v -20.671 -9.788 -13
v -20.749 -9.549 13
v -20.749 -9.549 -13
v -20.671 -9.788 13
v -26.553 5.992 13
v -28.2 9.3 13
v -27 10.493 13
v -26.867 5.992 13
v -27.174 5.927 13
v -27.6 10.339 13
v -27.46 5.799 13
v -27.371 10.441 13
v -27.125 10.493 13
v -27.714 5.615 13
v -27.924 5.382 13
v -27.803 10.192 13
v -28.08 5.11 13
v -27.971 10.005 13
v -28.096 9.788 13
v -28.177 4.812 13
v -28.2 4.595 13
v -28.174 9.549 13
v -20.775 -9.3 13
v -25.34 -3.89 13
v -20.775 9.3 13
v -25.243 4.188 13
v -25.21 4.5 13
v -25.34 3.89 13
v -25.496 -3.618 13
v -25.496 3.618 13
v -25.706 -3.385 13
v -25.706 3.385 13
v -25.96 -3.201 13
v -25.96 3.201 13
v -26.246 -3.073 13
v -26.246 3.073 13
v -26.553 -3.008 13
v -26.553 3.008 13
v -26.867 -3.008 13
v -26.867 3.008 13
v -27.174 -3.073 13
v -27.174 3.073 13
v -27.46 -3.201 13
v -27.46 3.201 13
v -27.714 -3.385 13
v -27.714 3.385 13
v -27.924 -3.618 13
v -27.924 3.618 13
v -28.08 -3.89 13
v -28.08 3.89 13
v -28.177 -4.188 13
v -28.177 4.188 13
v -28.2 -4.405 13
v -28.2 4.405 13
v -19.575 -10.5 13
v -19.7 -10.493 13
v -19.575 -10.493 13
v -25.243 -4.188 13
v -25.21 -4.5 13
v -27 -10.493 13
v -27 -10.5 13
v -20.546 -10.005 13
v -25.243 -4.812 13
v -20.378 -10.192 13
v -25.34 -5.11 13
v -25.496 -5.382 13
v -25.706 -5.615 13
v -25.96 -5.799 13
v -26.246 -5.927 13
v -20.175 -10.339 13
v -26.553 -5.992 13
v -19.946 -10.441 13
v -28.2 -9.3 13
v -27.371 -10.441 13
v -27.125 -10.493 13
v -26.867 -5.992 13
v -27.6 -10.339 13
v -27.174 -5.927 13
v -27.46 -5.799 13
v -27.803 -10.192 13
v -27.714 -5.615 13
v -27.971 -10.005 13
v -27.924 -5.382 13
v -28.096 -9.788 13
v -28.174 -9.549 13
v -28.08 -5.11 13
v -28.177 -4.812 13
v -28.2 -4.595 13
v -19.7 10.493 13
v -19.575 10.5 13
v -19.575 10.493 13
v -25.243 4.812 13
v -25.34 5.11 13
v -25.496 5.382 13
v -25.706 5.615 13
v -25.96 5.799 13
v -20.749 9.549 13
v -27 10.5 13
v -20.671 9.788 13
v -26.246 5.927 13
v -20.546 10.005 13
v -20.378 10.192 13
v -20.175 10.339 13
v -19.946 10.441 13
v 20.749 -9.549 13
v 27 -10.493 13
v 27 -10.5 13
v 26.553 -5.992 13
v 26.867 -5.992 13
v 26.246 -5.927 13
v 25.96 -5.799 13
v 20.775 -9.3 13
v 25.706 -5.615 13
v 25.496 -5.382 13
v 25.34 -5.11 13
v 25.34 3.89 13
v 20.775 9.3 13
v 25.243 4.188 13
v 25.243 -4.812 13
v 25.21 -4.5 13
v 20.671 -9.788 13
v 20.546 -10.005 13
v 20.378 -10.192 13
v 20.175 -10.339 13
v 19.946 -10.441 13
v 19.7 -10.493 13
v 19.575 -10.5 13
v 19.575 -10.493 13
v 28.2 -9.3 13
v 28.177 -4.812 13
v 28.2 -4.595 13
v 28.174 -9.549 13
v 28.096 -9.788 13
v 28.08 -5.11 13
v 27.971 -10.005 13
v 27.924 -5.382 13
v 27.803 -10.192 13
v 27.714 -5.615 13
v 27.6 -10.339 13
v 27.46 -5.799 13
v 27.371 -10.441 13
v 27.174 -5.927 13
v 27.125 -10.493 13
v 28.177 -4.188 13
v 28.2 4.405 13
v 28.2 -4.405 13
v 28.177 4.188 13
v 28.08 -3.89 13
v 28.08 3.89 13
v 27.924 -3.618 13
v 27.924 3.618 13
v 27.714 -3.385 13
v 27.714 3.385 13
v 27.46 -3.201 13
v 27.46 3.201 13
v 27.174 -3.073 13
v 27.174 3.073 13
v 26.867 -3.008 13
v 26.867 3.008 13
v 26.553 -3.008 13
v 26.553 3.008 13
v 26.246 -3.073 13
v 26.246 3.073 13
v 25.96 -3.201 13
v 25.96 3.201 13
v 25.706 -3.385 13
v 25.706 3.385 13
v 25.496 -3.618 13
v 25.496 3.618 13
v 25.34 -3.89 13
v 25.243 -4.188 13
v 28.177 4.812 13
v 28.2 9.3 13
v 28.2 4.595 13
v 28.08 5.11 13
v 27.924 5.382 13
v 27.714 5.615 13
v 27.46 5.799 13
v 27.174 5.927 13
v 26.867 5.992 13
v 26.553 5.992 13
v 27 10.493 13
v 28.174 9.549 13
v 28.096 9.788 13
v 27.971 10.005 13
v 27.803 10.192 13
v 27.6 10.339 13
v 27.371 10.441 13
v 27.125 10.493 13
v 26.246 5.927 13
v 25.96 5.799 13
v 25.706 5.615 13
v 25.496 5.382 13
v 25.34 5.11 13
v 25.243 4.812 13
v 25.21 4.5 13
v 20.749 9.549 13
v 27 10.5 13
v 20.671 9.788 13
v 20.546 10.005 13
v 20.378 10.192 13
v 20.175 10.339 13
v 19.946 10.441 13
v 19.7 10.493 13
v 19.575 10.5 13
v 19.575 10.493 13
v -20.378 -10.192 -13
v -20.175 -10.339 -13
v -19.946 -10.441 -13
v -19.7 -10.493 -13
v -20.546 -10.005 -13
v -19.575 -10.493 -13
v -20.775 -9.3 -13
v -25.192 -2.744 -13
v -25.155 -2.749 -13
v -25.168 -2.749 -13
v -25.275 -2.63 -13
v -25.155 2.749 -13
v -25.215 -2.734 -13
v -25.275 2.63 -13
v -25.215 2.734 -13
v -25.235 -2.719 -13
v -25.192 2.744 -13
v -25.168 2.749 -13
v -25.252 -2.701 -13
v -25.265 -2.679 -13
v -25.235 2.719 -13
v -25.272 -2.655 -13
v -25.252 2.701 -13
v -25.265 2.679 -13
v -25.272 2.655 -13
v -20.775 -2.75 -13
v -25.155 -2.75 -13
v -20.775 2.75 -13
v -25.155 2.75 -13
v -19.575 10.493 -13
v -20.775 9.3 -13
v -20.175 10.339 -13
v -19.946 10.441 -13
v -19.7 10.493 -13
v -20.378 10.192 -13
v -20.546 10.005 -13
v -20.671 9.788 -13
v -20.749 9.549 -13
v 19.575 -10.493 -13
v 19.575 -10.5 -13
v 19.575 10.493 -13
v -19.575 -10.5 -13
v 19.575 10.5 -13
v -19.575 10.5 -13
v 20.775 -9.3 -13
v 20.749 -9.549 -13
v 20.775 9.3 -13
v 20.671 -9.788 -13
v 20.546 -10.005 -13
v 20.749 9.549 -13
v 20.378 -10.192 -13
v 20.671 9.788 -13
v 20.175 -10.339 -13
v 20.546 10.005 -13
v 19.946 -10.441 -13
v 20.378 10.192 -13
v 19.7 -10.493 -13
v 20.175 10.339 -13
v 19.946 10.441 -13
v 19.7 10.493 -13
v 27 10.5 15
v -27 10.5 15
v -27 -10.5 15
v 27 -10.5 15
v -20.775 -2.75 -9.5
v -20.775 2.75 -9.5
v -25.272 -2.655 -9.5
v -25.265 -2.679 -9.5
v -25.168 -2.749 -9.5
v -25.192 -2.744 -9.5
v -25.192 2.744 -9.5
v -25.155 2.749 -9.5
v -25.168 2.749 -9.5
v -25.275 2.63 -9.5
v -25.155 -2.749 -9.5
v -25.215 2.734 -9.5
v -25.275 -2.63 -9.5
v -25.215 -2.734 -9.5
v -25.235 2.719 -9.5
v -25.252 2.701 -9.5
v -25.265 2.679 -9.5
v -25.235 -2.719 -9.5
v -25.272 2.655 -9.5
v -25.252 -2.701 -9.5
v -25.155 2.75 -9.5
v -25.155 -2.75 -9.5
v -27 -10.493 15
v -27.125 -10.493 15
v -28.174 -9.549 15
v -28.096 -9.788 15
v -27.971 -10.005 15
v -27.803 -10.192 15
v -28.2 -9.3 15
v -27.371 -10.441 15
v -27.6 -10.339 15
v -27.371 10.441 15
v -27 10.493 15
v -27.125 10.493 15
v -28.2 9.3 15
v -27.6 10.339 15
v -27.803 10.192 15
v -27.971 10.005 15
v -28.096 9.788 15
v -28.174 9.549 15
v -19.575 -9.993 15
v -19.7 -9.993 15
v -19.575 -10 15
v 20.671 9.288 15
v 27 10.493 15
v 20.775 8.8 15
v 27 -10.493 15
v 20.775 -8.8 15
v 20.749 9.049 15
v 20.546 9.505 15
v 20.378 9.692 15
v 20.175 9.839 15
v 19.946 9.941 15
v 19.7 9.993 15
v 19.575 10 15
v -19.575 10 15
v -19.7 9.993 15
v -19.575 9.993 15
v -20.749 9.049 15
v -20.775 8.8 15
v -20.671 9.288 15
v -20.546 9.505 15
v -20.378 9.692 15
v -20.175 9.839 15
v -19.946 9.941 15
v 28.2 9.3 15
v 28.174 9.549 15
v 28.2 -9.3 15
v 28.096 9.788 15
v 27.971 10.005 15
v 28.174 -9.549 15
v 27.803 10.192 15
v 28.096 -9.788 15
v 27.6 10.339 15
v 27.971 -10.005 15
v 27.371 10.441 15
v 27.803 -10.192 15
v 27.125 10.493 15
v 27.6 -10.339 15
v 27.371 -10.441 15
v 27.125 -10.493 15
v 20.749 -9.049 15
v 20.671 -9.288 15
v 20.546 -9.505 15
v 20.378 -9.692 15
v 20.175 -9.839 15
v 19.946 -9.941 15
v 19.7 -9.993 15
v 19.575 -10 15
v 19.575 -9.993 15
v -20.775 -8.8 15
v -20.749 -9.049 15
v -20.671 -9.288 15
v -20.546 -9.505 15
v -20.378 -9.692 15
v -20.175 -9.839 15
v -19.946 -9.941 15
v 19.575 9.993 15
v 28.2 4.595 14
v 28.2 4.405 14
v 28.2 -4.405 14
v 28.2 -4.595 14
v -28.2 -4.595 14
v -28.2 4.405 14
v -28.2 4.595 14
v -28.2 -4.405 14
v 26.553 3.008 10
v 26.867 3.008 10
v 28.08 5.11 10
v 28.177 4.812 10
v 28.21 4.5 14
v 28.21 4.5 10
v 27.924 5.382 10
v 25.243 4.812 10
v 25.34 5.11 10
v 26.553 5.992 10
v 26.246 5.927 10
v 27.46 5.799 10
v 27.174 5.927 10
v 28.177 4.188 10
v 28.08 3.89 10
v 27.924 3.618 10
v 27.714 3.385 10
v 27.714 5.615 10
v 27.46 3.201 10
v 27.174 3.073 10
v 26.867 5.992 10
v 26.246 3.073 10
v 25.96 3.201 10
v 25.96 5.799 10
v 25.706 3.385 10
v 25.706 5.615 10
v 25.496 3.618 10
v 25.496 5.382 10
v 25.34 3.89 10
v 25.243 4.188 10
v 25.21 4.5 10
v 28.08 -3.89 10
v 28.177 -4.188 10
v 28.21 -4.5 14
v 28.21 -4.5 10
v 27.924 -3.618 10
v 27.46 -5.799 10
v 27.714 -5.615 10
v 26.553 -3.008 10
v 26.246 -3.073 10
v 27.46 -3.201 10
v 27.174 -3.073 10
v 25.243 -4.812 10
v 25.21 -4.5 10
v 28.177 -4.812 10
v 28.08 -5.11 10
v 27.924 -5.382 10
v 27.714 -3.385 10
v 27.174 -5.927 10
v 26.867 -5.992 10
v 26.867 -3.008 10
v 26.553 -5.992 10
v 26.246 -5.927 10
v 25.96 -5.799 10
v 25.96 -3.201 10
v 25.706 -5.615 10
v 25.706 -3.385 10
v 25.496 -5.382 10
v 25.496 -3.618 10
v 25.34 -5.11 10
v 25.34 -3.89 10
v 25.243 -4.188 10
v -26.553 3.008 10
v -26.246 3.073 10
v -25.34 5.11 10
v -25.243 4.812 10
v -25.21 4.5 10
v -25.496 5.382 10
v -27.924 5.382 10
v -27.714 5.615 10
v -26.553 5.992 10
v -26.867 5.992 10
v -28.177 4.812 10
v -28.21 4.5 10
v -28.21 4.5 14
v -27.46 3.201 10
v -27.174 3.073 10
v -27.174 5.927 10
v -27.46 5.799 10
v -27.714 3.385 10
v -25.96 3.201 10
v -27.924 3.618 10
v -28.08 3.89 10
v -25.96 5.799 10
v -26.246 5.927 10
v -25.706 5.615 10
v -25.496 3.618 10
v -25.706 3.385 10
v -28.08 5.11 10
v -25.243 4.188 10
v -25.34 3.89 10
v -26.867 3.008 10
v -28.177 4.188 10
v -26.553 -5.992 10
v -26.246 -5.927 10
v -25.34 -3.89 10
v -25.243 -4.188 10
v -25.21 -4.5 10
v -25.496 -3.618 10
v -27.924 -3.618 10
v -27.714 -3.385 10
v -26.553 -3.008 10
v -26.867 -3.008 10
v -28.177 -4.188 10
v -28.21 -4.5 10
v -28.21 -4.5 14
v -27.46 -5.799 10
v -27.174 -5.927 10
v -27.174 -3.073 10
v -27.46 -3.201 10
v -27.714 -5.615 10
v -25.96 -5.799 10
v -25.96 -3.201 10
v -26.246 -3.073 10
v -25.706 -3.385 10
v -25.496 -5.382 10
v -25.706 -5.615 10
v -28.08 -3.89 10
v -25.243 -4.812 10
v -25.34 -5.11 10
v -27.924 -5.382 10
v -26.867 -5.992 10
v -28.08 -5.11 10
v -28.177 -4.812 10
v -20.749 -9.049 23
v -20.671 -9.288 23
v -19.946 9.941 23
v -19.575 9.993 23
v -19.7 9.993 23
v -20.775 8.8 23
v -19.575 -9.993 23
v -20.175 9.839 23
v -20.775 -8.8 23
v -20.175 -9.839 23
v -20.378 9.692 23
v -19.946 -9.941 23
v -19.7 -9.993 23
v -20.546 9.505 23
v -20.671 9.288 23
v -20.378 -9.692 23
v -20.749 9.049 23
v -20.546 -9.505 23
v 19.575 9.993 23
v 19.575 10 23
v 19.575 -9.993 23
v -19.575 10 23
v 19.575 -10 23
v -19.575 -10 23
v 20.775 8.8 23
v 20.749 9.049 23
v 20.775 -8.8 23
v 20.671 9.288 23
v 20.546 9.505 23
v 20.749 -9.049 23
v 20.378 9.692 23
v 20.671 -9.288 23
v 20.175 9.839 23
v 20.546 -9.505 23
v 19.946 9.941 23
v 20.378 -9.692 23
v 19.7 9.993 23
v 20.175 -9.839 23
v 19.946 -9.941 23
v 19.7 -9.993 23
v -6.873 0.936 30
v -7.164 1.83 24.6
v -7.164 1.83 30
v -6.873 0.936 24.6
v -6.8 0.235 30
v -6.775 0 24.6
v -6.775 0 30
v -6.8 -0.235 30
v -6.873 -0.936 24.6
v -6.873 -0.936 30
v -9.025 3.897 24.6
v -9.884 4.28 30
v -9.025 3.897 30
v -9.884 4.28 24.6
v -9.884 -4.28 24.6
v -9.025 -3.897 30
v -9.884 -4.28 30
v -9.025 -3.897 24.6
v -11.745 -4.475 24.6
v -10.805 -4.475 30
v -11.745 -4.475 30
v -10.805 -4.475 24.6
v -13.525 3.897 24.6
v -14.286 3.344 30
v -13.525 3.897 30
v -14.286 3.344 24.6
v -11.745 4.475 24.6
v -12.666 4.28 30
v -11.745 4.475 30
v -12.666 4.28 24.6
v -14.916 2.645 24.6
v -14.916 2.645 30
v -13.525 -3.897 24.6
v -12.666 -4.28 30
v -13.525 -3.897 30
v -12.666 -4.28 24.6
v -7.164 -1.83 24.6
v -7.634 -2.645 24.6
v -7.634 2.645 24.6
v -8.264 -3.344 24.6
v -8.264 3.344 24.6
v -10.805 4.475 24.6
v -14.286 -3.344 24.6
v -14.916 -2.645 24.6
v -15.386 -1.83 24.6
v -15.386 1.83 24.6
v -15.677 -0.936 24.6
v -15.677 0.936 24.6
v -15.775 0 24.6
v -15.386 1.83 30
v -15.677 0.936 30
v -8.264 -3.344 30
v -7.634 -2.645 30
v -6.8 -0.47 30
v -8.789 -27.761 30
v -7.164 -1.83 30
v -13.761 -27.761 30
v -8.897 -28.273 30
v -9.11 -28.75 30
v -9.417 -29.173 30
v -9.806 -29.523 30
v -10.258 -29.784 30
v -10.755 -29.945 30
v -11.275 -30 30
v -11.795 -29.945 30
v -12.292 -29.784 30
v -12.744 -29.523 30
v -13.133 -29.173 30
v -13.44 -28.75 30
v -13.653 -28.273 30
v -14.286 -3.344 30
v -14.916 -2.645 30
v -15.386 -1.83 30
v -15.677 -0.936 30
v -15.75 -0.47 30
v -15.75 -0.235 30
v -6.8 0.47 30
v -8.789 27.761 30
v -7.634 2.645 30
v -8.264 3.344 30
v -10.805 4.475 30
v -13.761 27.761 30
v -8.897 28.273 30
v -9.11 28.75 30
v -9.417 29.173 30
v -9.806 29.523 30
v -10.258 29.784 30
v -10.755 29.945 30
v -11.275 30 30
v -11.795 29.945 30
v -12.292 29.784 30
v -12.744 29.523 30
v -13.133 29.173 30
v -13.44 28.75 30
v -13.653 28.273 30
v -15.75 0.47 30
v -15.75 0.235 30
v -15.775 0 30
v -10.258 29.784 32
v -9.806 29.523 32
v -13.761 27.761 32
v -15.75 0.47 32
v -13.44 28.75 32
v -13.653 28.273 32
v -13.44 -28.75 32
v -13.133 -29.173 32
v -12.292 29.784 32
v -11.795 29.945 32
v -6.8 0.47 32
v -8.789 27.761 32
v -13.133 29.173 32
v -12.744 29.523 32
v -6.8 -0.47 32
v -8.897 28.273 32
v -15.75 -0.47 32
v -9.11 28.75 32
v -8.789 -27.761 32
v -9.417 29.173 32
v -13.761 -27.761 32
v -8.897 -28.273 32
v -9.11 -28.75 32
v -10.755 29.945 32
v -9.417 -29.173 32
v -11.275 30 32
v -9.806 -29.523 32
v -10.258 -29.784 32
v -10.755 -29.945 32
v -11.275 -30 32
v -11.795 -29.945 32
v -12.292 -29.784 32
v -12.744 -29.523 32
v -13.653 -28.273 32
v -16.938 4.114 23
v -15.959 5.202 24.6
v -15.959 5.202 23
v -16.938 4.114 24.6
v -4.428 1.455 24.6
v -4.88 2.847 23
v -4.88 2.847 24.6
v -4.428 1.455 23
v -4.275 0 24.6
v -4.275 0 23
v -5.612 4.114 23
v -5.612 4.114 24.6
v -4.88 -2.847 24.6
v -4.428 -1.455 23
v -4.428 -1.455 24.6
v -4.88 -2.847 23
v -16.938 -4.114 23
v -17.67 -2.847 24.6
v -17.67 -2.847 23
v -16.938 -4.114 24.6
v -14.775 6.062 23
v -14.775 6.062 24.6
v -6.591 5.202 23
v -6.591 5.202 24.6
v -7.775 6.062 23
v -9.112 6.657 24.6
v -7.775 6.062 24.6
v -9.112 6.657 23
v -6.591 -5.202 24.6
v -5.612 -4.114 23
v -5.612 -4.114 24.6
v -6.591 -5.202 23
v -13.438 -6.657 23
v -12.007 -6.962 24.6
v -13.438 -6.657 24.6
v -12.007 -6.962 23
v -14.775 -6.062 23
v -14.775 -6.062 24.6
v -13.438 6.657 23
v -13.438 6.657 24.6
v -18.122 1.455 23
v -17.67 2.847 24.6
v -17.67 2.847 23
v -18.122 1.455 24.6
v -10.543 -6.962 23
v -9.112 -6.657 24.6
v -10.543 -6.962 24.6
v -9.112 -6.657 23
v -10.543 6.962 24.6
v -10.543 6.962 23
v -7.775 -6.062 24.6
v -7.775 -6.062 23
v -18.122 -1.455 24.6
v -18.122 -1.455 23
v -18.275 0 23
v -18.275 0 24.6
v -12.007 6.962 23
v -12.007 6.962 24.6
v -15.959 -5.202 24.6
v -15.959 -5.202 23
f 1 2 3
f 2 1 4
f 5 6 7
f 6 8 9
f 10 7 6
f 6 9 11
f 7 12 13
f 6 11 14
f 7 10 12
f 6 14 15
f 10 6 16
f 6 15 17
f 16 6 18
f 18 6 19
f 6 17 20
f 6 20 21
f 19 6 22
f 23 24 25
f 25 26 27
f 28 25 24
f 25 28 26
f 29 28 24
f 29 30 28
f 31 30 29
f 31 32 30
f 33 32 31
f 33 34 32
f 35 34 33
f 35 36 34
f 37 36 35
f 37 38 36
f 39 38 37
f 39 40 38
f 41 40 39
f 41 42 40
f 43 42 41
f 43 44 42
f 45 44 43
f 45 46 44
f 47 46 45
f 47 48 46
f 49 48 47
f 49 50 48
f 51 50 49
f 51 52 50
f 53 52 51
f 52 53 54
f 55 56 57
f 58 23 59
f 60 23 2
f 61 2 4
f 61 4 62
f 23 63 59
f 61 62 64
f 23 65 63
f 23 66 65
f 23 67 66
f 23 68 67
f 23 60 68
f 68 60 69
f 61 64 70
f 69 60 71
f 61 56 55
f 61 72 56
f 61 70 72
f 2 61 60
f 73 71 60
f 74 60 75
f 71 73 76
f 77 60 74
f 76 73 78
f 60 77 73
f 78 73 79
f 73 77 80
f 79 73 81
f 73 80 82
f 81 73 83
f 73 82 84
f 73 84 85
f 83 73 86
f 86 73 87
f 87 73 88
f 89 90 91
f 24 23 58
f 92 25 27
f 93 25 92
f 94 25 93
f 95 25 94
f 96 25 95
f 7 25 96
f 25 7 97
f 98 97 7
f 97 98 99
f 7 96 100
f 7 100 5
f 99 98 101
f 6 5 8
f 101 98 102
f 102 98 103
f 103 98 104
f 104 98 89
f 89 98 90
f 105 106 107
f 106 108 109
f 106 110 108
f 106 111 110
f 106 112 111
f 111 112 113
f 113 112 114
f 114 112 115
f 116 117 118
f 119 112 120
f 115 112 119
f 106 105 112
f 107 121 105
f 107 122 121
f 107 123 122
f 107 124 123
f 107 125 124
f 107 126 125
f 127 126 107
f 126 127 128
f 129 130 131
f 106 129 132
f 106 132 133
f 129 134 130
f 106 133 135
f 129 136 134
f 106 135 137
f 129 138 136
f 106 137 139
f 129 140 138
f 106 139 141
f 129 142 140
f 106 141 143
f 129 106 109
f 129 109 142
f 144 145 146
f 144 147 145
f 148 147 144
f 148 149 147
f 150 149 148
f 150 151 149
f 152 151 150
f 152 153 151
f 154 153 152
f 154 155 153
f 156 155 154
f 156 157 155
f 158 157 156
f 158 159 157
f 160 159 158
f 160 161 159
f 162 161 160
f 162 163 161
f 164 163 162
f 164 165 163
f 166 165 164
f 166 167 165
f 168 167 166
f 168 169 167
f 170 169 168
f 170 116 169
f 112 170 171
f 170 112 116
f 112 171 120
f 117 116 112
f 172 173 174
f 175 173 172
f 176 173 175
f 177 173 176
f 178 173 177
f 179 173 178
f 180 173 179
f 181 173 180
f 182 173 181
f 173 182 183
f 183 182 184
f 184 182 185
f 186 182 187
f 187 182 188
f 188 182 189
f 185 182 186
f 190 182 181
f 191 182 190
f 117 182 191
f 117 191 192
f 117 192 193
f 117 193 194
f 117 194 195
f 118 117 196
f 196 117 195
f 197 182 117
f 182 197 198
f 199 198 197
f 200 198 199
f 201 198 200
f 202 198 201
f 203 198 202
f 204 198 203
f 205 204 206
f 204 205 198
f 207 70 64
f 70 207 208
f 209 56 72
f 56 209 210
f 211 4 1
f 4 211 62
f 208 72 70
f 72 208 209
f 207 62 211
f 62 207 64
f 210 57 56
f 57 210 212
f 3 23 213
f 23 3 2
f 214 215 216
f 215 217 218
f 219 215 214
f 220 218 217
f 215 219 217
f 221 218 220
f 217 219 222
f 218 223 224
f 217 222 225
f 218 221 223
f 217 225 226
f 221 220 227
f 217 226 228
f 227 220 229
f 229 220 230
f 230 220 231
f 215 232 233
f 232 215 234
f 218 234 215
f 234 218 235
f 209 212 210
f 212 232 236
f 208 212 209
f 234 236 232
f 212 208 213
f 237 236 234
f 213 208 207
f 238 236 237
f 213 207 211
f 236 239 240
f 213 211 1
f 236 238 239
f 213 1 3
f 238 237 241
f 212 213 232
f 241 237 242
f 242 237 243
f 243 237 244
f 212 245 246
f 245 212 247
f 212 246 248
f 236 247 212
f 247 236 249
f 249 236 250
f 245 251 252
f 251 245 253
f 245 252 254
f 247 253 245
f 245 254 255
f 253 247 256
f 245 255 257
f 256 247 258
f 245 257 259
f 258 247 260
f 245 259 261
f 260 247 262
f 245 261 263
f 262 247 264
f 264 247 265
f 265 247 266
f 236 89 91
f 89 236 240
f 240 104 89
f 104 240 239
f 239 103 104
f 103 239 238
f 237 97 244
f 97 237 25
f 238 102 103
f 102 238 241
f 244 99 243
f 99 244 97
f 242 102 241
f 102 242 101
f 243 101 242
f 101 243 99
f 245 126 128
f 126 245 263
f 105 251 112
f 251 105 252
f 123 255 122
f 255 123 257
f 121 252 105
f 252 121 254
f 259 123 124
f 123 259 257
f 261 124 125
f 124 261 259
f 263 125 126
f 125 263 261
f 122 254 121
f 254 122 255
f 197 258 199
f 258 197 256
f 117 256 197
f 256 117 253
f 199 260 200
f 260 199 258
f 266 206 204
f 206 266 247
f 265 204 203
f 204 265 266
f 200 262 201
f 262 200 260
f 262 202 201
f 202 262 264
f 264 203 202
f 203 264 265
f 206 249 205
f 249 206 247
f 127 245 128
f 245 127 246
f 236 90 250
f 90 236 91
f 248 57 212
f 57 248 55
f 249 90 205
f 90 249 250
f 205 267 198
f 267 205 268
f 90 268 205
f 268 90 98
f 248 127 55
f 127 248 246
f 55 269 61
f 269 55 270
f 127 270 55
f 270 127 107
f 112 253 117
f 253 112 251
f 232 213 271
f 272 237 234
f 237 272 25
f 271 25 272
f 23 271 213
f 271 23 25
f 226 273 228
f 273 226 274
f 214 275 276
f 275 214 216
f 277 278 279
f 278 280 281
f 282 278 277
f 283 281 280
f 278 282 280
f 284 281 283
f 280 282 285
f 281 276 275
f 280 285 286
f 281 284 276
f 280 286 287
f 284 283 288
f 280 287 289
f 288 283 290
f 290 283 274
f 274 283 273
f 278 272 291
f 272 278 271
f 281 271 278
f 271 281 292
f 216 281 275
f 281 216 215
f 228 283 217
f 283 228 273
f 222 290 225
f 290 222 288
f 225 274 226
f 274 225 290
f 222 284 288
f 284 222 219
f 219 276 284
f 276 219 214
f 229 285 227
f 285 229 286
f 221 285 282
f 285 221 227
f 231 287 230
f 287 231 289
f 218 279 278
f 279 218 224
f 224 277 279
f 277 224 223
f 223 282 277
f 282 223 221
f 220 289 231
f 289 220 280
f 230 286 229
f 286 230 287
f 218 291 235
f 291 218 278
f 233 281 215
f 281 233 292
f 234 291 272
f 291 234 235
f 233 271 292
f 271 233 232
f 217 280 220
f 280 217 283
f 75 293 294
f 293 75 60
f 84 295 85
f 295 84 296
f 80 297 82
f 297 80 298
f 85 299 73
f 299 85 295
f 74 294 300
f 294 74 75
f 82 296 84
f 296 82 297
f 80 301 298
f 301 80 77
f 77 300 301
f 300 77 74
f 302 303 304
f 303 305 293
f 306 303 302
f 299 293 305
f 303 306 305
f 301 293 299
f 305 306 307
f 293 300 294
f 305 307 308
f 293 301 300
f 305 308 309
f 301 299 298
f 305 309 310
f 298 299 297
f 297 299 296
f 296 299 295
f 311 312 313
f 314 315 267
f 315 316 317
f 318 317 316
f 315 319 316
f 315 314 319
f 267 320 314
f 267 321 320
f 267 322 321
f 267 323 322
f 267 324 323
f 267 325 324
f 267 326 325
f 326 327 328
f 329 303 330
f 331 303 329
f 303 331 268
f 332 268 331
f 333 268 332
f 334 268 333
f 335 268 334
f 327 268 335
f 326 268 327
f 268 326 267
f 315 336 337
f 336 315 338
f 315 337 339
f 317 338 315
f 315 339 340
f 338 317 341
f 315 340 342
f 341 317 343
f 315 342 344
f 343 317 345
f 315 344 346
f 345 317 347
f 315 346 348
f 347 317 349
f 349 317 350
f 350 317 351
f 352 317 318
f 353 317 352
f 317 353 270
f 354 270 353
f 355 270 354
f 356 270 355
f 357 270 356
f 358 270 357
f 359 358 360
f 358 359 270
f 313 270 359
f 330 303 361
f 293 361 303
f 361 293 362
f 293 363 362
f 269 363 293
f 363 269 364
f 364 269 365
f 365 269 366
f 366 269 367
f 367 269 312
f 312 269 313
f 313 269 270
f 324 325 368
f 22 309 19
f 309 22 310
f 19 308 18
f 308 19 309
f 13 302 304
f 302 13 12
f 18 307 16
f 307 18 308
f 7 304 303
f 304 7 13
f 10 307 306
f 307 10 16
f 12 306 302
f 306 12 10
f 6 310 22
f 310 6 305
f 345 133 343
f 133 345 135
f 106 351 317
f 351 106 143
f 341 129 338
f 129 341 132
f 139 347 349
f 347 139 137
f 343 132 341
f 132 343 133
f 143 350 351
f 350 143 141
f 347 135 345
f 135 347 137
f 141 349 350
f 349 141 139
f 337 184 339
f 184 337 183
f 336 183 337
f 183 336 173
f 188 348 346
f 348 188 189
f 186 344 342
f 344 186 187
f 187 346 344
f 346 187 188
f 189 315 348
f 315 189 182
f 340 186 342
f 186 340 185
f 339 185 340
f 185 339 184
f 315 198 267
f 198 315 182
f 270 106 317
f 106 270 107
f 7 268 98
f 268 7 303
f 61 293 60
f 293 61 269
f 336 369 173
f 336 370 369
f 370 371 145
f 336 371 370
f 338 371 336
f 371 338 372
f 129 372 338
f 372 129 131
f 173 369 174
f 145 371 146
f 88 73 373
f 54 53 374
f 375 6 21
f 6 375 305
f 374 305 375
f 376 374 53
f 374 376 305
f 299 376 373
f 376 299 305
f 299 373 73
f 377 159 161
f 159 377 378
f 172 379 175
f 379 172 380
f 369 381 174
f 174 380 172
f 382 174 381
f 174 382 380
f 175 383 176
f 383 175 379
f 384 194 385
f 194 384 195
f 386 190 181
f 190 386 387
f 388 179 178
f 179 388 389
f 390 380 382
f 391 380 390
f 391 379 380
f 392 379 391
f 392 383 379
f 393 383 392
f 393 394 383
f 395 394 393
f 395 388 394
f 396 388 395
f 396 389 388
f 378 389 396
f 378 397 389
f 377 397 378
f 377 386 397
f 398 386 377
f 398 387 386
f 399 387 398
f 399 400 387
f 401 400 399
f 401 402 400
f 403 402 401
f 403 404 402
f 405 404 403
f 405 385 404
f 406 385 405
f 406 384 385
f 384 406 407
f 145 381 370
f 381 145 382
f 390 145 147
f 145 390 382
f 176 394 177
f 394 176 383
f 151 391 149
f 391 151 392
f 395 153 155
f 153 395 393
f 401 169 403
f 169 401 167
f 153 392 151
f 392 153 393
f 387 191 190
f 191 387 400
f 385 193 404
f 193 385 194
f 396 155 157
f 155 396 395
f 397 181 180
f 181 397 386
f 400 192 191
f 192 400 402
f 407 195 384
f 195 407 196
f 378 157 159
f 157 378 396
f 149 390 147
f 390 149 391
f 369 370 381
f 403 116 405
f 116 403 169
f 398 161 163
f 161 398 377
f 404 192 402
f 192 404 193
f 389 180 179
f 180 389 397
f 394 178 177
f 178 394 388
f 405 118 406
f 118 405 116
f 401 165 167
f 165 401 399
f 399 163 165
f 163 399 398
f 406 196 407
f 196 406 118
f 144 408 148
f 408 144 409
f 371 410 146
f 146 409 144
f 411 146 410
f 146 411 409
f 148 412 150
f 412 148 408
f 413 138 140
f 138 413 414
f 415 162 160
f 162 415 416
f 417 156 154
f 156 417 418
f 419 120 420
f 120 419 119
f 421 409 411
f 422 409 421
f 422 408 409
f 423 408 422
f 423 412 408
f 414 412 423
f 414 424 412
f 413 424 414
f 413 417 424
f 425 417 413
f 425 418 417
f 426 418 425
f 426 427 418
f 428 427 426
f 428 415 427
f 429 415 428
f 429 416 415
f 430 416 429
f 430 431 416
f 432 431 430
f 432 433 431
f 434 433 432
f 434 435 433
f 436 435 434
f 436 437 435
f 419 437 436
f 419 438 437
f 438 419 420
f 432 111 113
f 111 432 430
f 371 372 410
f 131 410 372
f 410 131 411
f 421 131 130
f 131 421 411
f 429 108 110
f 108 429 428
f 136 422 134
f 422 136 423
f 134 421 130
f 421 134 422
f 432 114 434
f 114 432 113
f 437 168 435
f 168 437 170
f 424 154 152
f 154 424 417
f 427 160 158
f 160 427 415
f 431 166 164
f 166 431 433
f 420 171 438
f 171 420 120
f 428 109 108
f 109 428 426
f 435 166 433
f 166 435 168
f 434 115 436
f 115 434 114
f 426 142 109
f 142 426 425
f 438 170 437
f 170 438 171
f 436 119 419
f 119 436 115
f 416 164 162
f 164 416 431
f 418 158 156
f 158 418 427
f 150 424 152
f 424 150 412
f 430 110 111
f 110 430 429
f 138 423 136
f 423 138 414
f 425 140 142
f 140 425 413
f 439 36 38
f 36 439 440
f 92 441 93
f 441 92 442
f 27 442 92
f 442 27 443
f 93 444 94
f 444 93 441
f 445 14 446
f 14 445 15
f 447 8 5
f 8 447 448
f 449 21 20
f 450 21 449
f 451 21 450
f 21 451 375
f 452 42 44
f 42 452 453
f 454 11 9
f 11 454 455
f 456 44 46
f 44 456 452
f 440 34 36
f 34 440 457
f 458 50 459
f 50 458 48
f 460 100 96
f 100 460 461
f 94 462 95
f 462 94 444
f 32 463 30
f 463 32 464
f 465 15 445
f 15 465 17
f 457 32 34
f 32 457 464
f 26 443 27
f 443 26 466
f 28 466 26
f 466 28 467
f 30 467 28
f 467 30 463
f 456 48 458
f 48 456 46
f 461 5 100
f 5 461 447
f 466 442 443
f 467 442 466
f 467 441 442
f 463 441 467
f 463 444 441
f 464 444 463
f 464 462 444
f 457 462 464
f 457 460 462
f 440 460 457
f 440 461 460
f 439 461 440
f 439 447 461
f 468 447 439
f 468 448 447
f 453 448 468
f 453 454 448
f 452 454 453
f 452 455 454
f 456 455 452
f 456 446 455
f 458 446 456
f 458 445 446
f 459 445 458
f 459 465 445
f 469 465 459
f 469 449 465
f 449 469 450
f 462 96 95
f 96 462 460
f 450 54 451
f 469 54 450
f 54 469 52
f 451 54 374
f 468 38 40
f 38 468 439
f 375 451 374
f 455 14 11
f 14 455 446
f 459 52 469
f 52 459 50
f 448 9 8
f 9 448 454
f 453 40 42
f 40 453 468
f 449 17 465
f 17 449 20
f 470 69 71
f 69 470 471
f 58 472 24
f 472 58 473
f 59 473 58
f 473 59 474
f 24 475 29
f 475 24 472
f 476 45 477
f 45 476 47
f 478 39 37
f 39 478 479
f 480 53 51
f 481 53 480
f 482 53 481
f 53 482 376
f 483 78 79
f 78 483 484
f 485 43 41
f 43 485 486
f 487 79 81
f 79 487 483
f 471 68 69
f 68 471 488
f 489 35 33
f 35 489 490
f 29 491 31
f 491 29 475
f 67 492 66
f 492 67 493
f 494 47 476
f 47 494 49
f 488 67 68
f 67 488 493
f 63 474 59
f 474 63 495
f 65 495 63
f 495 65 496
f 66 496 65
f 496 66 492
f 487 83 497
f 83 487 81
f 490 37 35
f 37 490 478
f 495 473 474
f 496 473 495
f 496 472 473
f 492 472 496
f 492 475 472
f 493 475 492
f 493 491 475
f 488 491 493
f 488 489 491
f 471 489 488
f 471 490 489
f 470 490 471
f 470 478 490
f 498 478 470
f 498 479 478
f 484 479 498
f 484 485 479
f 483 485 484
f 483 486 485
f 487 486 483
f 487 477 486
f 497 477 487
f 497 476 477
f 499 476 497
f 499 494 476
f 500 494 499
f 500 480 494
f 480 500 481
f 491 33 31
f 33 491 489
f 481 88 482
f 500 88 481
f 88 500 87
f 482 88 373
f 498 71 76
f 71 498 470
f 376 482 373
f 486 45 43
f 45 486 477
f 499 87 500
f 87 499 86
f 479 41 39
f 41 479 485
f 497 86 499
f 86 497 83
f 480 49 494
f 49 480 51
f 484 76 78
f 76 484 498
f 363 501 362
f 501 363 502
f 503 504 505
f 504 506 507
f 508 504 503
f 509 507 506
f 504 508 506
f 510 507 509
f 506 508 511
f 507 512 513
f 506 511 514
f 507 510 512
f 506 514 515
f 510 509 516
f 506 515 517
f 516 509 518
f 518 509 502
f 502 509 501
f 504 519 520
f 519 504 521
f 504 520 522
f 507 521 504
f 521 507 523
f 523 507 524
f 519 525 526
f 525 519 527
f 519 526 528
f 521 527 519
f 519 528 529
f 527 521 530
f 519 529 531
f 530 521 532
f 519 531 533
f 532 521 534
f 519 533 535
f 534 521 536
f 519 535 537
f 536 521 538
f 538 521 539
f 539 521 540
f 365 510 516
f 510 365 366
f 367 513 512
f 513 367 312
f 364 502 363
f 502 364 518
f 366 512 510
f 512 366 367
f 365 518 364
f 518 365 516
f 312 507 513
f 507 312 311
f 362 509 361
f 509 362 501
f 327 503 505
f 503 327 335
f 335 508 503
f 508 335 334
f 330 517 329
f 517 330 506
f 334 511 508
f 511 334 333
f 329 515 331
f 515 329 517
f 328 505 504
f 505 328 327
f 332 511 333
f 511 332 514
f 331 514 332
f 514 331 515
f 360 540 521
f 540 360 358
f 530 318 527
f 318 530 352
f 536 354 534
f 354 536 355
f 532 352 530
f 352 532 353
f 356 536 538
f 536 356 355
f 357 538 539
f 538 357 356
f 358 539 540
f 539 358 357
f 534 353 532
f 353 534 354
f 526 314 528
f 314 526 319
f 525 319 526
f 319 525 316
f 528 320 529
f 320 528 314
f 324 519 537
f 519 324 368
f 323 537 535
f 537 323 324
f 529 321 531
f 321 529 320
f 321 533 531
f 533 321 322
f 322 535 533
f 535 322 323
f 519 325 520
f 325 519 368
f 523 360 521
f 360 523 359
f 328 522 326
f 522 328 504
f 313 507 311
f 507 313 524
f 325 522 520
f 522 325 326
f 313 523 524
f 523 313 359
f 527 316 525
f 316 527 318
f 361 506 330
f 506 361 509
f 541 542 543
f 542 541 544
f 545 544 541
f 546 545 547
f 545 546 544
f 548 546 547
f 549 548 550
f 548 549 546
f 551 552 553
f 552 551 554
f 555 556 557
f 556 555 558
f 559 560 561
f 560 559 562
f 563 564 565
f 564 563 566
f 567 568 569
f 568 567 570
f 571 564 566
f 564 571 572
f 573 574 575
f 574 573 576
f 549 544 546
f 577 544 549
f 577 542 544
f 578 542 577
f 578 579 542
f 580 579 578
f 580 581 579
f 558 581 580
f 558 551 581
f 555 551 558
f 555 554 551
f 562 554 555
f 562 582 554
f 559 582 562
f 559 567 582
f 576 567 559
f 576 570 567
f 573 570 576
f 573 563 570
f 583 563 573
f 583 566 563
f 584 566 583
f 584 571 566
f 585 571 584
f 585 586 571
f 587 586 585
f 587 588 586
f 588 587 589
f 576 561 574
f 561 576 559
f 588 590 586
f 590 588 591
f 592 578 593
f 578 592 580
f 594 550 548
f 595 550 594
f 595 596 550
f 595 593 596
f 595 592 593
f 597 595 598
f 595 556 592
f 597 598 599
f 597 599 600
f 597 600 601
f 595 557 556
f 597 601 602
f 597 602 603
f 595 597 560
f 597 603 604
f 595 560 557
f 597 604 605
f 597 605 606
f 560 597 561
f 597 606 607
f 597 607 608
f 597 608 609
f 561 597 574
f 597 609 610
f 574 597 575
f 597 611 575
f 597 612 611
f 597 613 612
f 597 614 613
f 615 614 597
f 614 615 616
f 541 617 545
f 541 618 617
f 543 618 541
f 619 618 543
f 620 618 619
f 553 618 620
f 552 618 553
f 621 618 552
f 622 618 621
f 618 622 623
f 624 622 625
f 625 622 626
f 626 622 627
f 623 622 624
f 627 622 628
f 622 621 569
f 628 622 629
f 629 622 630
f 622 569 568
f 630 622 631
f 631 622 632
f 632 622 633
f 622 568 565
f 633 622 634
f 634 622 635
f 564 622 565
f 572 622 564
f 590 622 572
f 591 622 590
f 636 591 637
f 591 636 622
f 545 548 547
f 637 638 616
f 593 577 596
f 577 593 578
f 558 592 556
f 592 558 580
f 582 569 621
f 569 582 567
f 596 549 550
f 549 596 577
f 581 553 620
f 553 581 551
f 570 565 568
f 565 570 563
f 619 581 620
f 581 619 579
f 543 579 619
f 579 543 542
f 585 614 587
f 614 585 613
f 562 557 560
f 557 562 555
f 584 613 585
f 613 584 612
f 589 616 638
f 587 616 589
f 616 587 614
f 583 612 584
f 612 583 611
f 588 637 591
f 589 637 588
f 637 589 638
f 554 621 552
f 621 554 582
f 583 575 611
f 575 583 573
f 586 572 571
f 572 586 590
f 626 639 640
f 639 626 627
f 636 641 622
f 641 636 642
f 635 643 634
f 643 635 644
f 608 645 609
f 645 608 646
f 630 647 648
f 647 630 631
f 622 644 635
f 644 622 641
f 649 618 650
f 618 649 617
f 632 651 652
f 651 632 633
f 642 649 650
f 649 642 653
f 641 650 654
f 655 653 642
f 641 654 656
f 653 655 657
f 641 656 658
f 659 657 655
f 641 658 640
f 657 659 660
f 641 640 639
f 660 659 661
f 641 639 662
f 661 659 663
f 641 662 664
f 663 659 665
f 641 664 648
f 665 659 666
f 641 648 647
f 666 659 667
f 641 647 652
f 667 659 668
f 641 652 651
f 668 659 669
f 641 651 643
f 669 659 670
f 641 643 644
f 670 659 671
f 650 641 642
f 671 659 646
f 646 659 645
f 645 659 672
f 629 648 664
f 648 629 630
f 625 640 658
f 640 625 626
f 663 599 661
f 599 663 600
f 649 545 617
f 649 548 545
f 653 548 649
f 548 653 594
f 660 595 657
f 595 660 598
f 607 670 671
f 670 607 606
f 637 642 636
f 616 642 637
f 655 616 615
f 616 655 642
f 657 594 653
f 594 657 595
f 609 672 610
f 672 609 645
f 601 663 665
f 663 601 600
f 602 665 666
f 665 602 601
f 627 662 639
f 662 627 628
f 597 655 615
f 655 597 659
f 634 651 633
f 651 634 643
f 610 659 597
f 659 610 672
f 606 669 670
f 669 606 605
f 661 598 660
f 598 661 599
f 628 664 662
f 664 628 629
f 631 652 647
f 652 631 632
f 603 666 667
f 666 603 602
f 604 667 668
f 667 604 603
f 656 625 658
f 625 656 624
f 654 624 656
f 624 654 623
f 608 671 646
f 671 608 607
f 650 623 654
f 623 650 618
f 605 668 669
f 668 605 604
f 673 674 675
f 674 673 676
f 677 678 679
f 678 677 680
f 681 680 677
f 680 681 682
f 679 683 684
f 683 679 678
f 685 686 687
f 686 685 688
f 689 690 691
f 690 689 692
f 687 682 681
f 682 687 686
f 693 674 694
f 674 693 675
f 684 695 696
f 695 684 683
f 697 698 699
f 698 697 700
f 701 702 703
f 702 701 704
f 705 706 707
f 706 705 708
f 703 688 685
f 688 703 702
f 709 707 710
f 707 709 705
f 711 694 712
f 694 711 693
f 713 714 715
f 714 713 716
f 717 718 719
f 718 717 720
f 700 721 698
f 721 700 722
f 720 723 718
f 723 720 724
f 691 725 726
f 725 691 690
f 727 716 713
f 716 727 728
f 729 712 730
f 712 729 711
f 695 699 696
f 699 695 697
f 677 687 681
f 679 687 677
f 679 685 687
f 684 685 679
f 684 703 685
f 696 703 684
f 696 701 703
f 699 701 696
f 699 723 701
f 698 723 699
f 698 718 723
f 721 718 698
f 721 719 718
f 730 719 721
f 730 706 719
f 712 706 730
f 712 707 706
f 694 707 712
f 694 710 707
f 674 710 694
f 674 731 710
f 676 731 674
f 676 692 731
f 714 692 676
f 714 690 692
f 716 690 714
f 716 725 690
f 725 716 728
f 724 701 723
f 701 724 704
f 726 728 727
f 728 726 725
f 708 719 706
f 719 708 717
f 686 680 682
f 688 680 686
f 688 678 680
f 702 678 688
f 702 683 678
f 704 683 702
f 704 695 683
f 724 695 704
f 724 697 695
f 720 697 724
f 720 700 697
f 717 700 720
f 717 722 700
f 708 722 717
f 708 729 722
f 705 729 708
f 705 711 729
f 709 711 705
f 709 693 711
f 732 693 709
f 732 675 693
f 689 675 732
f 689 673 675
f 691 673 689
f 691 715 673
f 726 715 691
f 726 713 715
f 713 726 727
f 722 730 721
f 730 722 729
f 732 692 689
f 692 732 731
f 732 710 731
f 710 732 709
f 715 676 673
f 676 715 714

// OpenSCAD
//Based on https://github.com/fibasile/HS-311-OpenSCAD
 use <MCAD/boxes.scad>

servo_width = 41.55;
servo_depth = 21;
base_height = 26;
top_height = 6;
screws_distance_apart = 9;
screws_distance_width = 5;
screw_width=3;
ears_width = 56.4;
ears_height = 2;
ears_top_height = 0;
round_top_depth = 20;
round_top_width = 41.55;
round_top_height = 8;
rounded = 1.2;
top_cylinder_height=1.6;
top_cylinder_radius=7;
top_cylinder_offset = 2.5+top_cylinder_radius;
wheel_inner_cylinder_height = 7-top_cylinder_height;
wheel_inner_cylinder_radius = 9/2;
wheel_height=2;
wheel_radius=45/2.0;

cable_box_width = 9;
cable_box_depth = 5.5;
cable_box_height = 3.5;


$fs=0.01;

module double_horn() {
  hull() {
    cylinder(d=9,h=wheel_height,center=true);
    translate([27.5,0,0])cylinder(d=5,h=wheel_height,center=true);
    translate([-27.5,0,0])cylinder(d=5,h=wheel_height,center=true);
  }
}


module hs311_screw(){
	cylinder(h=2*ears_height, r=screw_width/2.0, center=true);
}

module hs311(position, rotation, screws = 0, axle_lenght = 0)
{
	translate(position)
	{
		rotate(rotation)
	    {
			union()
			{
                //main body
                roundedBox([servo_width,servo_depth,base_height],rounded,true);
				 translate([-servo_width/2.0,0,-base_height/2.0+cable_box_height/2.0]) roundedBox([cable_box_width,cable_box_depth,cable_box_height], rounded/10,true);
                translate([0,0,base_height/2.0 + ears_height /2.0]){
 	                union(){
                    roundedBox([ears_width, servo_depth, ears_height ],rounded,true);
					union(){

                    translate([(ears_width-screw_width)/2.0+0.01, screws_distance_apart/2.0, -ears_height]) hs311_screw();
                    translate([(ears_width-screw_width)/2.0+0.01, -screws_distance_apart/2.0, -ears_height]) hs311_screw();
                    translate([-(ears_width-screw_width)/2.0-0.01, screws_distance_apart/2.0, -ears_height]) hs311_screw();
                    translate([-(ears_width-screw_width)/2.0-0.01, -screws_distance_apart/2.0, -ears_height]) hs311_screw();
					}
					}


                    
    				translate([ 0,0, ears_height/2.0 + ears_top_height/2.0 ]){
	    	            roundedBox([servo_width,servo_depth, ears_top_height ],rounded,true);
						 translate([0,0,ears_top_height/2.0 + round_top_height/2.0]) {
							translate([(servo_width-round_top_width)/-2,0,0])
                                roundedBox([round_top_width,round_top_depth,round_top_height ],rounded,true);
							translate([-servo_width/2.0+top_cylinder_offset,0,round_top_height/2.0+top_cylinder_height/2.0]){
								cylinder(h=top_cylinder_height,r=top_cylinder_radius,center=true);
								translate([0,0,top_cylinder_height/2.0]) {
									cylinder(h=wheel_inner_cylinder_height,r=wheel_inner_cylinder_radius);
									  translate([0,0,wheel_inner_cylinder_height+wheel_height/2])
                                             rotate(90) double_horn();
;
									}
								}
                        }
					 }
				 }				                
            }
        }
    }
}



module test_hs311(){hs311();}

test_hs311();
